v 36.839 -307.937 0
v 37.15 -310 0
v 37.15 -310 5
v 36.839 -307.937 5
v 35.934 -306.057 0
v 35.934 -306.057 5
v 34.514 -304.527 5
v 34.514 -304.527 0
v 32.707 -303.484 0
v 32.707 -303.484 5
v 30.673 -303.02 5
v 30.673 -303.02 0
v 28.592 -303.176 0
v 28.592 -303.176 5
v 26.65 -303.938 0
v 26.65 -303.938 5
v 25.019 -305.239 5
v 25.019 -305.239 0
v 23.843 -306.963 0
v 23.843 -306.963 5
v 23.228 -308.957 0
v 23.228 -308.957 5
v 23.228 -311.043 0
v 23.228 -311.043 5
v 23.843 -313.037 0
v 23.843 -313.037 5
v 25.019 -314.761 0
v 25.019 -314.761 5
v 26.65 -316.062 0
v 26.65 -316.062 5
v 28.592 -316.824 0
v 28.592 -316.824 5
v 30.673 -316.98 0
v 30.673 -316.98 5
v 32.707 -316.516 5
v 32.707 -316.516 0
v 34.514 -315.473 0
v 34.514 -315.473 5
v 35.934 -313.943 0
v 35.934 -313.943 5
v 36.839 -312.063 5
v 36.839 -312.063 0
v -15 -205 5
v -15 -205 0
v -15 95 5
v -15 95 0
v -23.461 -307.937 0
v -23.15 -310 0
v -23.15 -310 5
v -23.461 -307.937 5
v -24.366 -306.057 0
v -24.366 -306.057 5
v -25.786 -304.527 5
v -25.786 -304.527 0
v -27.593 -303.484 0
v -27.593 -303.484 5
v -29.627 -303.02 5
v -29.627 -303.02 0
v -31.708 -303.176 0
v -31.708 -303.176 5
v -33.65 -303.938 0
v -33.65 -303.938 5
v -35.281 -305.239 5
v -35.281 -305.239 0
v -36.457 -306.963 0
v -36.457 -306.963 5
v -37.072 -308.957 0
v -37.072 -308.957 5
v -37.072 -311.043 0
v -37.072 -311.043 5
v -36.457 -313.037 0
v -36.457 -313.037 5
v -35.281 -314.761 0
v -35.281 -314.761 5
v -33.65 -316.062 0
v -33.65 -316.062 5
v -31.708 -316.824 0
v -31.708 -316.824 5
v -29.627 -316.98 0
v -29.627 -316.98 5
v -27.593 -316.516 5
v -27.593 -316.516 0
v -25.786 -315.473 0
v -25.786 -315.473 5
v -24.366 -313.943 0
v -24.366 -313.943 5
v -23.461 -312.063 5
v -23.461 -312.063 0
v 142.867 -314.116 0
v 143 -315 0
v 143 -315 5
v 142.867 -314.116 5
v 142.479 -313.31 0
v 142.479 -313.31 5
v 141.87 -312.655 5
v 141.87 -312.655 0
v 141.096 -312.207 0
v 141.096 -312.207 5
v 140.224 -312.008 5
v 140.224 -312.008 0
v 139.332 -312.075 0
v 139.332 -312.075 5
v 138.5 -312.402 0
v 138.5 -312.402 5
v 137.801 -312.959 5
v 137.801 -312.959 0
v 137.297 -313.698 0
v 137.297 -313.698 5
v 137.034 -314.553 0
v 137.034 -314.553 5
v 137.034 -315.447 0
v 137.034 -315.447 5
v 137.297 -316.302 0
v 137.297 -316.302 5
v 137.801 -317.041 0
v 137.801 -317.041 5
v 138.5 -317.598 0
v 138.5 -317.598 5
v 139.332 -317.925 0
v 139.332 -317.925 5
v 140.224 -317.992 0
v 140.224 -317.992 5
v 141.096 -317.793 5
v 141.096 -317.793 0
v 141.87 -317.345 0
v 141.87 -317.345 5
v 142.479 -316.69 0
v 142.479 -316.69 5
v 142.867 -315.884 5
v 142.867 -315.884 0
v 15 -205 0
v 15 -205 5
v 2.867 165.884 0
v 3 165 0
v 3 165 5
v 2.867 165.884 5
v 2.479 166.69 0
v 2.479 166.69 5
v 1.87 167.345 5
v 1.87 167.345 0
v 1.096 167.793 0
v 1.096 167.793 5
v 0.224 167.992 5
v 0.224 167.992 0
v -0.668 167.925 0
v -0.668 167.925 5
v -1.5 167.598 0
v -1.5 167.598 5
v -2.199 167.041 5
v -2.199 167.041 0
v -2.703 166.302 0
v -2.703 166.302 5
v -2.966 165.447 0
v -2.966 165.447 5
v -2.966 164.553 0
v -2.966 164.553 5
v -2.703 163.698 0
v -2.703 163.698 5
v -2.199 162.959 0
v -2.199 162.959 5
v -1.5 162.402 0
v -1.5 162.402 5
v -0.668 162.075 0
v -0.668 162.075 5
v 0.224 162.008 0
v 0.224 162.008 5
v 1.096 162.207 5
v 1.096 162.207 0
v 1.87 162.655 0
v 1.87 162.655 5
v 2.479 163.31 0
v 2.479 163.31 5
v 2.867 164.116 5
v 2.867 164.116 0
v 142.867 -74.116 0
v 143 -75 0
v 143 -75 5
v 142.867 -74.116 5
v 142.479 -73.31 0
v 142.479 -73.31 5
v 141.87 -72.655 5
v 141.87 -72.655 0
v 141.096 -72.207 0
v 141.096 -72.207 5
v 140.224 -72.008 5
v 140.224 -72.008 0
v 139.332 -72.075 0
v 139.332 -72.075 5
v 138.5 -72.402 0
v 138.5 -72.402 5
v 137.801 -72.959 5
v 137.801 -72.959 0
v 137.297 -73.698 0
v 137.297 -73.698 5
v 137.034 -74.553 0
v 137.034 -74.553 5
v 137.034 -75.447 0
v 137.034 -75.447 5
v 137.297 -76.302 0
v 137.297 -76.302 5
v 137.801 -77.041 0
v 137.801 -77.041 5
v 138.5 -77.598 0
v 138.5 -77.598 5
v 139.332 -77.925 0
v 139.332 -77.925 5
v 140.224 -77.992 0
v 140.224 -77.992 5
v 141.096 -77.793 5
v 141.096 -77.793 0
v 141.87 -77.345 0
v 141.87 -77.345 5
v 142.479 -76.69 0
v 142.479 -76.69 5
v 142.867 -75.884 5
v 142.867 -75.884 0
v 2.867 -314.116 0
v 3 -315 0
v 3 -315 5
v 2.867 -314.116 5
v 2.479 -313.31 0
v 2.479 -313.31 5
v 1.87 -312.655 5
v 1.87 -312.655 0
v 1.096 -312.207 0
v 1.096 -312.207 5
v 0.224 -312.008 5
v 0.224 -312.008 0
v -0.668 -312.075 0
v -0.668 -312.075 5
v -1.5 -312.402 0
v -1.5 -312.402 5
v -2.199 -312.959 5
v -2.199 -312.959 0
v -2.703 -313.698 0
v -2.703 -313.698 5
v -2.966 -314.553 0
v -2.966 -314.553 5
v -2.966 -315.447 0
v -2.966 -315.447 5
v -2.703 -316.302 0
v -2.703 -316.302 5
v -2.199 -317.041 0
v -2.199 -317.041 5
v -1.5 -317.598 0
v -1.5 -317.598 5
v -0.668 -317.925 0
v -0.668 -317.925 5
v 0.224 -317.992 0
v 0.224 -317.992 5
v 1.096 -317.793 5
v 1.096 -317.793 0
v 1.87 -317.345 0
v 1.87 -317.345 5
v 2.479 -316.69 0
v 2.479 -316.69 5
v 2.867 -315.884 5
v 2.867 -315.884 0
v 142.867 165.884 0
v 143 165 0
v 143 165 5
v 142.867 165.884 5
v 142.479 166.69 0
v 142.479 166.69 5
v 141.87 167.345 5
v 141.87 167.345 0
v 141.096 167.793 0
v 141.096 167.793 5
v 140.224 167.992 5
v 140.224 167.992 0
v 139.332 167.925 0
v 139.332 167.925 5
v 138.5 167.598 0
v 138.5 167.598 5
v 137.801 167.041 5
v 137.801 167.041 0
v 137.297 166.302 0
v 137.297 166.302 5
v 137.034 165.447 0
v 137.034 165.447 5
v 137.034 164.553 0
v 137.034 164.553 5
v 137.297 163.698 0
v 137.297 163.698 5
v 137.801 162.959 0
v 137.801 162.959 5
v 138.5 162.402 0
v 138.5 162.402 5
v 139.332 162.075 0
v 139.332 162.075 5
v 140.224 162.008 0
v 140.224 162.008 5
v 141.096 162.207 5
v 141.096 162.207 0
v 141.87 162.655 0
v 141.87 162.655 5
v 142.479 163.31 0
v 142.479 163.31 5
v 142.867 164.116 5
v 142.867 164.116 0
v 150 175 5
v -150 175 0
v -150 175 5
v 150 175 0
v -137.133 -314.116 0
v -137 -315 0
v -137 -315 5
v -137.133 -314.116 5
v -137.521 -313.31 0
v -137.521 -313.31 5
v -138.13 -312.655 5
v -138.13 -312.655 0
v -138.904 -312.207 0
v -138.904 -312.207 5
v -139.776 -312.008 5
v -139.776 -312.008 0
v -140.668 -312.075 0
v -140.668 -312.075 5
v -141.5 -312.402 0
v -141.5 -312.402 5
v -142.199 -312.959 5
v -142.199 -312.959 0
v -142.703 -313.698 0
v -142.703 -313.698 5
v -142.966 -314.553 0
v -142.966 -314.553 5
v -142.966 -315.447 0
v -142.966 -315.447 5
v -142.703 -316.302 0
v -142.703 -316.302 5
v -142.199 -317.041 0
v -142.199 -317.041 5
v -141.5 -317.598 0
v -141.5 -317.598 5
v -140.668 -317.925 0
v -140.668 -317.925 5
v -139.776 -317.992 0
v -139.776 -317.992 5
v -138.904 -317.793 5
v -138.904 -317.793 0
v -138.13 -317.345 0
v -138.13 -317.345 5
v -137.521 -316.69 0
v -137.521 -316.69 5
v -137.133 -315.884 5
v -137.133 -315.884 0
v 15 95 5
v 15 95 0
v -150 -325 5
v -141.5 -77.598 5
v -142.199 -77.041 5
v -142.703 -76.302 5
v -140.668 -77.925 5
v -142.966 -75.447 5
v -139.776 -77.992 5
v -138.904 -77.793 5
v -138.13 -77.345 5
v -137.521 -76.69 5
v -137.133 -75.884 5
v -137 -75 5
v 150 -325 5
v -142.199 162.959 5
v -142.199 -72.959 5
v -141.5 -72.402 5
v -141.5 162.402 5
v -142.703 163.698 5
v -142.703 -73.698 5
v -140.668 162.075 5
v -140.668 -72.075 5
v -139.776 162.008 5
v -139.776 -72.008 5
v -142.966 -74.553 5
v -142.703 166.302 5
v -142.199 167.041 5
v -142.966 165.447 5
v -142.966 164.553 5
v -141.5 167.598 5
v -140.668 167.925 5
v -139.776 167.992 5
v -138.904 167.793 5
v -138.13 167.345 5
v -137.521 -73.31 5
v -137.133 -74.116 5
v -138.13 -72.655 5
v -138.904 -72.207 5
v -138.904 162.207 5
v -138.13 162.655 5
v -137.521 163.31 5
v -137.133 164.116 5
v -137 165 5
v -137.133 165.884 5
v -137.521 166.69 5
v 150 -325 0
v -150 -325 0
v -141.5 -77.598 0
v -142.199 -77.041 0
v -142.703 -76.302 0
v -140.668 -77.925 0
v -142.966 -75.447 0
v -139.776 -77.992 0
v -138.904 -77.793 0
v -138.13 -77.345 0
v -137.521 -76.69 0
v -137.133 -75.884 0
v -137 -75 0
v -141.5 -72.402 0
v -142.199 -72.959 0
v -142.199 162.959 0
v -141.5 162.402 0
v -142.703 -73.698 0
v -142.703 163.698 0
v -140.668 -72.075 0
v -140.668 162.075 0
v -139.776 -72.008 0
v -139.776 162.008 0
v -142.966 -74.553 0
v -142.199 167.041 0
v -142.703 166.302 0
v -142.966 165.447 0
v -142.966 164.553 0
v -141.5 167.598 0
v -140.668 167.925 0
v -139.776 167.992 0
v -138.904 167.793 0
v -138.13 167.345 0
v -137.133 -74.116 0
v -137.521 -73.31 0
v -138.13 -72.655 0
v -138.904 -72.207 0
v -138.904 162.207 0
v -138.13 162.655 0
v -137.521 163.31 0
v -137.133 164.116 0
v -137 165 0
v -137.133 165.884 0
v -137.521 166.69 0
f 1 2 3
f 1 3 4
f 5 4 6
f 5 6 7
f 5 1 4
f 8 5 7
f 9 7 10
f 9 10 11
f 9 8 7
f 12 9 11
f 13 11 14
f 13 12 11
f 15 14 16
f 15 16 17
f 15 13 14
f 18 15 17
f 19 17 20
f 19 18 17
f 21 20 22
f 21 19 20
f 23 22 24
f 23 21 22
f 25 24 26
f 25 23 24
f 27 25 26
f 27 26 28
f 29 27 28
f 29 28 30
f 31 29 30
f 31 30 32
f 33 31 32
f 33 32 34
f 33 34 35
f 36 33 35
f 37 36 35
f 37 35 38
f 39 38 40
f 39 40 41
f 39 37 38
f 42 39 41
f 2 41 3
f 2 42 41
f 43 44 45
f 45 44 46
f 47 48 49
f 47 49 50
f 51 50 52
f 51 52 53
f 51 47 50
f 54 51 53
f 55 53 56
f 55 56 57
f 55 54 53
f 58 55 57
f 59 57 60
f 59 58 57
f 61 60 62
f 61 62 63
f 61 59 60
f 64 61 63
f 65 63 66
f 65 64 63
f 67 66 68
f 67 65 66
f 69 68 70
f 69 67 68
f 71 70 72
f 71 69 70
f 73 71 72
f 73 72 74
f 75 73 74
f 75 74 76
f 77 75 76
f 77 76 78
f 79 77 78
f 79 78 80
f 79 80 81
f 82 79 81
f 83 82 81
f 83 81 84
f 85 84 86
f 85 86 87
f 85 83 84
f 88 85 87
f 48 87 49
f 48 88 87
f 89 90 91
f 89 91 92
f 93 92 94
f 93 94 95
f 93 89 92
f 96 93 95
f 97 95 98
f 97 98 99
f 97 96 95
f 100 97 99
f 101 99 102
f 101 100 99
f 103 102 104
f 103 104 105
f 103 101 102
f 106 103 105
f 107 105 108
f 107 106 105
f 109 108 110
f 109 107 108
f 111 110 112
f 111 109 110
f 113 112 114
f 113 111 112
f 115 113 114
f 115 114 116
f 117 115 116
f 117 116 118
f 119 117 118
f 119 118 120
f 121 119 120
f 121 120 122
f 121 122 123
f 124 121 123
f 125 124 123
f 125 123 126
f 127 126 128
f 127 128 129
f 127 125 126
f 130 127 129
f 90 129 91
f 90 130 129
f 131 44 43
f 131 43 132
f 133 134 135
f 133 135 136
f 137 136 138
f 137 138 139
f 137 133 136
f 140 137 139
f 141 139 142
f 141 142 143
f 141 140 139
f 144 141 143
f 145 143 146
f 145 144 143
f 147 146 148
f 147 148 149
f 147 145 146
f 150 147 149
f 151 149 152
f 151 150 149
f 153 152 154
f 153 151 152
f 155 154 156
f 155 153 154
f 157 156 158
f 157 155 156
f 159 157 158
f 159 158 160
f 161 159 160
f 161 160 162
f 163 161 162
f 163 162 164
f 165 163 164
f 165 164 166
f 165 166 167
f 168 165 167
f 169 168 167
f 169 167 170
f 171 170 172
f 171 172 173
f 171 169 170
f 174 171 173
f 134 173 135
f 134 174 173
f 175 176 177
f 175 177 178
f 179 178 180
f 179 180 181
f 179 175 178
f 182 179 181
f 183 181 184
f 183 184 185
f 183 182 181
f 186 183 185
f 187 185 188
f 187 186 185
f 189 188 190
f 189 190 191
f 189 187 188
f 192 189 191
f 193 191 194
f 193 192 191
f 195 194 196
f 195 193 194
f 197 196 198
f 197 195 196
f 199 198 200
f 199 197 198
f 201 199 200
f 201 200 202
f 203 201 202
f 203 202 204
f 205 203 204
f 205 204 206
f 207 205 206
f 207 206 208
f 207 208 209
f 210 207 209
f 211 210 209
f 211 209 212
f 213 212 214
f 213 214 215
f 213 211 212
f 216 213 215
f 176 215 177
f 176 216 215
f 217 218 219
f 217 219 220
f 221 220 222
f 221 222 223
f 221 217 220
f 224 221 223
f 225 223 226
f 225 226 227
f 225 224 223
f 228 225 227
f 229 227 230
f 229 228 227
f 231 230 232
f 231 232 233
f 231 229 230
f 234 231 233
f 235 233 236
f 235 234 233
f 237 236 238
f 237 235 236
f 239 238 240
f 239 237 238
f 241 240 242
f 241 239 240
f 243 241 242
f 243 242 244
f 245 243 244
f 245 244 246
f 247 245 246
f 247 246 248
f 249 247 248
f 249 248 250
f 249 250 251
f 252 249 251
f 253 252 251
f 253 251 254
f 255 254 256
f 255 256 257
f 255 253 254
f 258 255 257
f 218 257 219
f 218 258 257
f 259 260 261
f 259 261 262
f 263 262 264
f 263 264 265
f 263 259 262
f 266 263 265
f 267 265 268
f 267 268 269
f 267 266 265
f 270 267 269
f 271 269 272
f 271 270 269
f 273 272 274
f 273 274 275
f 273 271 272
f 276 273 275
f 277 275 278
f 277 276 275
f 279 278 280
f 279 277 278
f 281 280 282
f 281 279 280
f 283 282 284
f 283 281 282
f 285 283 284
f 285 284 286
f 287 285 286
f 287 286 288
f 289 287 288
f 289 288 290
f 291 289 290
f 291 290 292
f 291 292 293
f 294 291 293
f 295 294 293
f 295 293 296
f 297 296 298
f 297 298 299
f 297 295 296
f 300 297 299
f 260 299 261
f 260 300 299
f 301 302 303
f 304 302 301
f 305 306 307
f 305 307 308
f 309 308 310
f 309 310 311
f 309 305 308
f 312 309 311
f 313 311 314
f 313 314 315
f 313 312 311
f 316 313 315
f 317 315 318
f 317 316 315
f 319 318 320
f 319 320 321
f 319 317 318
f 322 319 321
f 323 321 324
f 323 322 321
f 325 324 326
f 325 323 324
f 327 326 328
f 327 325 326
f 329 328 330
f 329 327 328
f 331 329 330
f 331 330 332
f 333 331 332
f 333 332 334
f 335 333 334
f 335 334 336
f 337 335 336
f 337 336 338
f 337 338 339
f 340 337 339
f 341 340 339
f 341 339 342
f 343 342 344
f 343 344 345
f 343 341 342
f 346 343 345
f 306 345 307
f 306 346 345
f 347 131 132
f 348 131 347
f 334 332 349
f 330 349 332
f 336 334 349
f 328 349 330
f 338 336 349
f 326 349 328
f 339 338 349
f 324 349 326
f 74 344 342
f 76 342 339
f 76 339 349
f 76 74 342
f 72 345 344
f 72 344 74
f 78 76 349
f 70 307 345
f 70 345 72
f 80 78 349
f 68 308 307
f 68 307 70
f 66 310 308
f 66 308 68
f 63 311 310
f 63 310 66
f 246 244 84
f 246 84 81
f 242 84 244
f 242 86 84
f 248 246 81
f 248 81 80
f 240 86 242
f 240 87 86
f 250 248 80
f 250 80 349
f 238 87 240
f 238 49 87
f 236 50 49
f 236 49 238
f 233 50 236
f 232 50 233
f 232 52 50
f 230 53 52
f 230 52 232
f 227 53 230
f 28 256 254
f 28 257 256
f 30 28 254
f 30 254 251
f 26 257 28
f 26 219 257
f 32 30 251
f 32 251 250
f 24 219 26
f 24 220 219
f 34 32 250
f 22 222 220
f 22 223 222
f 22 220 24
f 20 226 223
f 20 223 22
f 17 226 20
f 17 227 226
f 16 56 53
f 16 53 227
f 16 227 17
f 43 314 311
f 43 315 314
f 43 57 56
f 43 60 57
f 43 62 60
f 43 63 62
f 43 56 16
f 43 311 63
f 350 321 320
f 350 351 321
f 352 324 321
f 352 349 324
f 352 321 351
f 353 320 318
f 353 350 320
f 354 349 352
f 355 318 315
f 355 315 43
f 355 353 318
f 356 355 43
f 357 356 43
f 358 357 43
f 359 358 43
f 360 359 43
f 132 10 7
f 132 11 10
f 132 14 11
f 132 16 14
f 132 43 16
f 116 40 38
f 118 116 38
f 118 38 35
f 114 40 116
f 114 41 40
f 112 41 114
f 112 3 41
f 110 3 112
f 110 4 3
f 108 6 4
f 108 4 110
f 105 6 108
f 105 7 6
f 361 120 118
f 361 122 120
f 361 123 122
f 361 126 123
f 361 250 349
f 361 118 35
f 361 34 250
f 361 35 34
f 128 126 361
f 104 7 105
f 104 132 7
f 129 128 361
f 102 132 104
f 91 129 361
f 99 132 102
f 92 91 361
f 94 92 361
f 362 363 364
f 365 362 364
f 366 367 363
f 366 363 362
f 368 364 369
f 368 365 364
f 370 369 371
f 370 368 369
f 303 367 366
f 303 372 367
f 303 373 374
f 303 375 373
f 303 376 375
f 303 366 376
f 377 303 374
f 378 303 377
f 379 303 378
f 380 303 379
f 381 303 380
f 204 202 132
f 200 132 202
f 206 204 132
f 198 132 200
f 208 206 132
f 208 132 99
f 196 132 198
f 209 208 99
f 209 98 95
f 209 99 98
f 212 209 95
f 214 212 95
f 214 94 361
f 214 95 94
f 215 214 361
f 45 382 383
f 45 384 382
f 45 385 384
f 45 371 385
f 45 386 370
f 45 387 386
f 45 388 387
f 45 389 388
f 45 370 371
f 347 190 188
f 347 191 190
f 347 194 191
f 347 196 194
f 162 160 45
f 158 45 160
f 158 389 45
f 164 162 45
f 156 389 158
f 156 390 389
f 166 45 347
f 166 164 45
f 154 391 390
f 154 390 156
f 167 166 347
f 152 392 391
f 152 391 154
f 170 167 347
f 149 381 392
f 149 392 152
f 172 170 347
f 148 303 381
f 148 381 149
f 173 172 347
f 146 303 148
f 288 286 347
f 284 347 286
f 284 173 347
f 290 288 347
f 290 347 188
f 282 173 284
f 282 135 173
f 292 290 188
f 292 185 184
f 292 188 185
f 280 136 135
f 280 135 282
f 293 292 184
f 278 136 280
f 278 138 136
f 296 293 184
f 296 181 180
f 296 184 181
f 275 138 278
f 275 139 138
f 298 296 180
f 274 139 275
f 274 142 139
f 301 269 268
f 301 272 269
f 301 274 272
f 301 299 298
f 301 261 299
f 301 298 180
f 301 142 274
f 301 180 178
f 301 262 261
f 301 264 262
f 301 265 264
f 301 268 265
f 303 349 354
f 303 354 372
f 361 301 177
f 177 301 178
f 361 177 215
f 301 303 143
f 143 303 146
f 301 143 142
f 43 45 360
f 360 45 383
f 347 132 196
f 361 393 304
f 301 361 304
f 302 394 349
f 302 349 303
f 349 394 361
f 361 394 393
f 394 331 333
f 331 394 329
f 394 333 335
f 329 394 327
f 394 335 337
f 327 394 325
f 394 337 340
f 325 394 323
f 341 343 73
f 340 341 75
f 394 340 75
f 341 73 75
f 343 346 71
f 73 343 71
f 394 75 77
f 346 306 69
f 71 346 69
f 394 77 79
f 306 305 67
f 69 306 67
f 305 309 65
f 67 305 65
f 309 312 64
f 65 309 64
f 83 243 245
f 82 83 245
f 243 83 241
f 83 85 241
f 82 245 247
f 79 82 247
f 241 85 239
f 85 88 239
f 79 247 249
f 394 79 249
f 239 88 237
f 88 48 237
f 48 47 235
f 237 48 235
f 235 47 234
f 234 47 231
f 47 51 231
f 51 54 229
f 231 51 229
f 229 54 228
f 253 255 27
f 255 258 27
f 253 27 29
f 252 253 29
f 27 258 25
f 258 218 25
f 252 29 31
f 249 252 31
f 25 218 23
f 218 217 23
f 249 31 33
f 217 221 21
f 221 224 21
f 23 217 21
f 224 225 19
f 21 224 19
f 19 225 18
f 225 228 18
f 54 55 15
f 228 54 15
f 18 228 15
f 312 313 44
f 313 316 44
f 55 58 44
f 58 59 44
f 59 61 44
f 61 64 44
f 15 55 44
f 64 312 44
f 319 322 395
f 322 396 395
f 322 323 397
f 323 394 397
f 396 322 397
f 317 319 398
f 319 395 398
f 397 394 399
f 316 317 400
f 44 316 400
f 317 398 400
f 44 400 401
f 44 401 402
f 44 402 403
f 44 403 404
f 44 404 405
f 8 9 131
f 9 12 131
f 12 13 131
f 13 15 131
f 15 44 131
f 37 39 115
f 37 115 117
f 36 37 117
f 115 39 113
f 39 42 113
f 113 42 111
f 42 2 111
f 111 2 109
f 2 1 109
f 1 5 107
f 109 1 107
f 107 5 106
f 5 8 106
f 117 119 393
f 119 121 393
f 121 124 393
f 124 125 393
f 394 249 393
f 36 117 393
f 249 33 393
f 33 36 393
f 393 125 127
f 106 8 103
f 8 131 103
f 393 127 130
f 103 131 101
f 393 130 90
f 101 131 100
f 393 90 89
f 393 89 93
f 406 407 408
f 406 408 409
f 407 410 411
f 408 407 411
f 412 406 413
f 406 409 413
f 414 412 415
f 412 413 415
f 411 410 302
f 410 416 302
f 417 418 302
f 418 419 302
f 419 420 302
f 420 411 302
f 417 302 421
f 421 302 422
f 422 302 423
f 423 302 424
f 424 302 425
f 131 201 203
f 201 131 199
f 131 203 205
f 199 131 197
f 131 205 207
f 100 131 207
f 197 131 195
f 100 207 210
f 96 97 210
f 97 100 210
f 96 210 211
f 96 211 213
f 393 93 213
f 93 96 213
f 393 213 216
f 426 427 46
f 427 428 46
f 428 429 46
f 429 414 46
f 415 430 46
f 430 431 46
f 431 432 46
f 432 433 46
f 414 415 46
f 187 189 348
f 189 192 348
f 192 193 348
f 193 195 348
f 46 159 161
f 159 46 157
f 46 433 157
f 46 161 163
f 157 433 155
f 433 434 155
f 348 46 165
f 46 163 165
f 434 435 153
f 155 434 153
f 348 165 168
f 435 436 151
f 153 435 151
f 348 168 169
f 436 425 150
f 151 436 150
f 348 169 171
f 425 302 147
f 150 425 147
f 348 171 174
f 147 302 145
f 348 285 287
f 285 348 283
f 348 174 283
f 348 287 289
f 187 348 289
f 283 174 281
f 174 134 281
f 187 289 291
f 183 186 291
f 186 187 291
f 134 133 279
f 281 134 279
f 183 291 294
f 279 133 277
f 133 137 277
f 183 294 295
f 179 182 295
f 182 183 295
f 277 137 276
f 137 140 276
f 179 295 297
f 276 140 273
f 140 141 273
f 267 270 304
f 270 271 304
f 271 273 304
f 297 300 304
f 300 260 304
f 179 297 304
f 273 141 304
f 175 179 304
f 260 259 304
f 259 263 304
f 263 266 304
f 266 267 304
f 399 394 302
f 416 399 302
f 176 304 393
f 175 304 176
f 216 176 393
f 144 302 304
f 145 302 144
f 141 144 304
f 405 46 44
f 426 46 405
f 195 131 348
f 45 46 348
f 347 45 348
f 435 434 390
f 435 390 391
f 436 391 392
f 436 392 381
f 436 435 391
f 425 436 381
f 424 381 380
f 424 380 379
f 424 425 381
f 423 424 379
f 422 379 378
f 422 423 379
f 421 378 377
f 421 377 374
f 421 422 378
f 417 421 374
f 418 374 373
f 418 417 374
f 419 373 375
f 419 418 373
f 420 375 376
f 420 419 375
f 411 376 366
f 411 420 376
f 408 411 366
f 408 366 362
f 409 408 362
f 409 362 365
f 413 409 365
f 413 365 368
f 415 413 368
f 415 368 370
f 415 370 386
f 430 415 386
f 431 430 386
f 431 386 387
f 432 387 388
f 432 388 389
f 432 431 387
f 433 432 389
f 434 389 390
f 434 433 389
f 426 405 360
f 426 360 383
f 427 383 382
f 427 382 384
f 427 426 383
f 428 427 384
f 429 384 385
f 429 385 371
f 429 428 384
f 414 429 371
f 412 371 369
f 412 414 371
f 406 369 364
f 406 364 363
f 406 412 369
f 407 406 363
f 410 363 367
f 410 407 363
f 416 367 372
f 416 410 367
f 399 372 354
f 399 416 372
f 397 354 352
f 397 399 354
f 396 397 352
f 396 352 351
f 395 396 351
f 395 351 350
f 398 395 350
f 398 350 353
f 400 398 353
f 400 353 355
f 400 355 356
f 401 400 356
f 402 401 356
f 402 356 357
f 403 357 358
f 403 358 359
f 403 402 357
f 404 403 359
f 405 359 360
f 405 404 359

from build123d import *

# Parameters (mm, degrees)
SKETCH1_W           = 300
SKETCH1_H           = 500
SKETCH1_R           = 3
SKETCH1_R_2         = 7
SKETCH1_W_2         = 30
SKETCH1_H_2         = 300
BOSS_EXTRUDE1_DEPTH = 5


with BuildPart() as part:
    # Sketch1 → Boss-Extrude1 (new body)
    with BuildSketch(Plane.XY):
        with Locations((0, -75)):
            Rectangle(SKETCH1_W, SKETCH1_H)
        with Locations((-140, -75)):
            Circle(SKETCH1_R, mode=Mode.SUBTRACT)
        with Locations((140, -315)):
            Circle(SKETCH1_R, mode=Mode.SUBTRACT)
        with Locations((140, -75)):
            Circle(SKETCH1_R, mode=Mode.SUBTRACT)
        with Locations((140, 165)):
            Circle(SKETCH1_R, mode=Mode.SUBTRACT)
        with Locations((0, 165)):
            Circle(SKETCH1_R, mode=Mode.SUBTRACT)
        with Locations((0, -315)):
            Circle(SKETCH1_R, mode=Mode.SUBTRACT)
        with Locations((-140, 165)):
            Circle(SKETCH1_R, mode=Mode.SUBTRACT)
        with Locations((-140, -315)):
            Circle(SKETCH1_R, mode=Mode.SUBTRACT)
        with Locations((-30.15, -310)):
            Circle(SKETCH1_R_2, mode=Mode.SUBTRACT)
        with Locations((30.15, -310)):
            Circle(SKETCH1_R_2, mode=Mode.SUBTRACT)
        with Locations((0, -55)):
            Rectangle(SKETCH1_W_2, SKETCH1_H_2, mode=Mode.SUBTRACT)
    extrude(amount=BOSS_EXTRUDE1_DEPTH)


solid = part.part
